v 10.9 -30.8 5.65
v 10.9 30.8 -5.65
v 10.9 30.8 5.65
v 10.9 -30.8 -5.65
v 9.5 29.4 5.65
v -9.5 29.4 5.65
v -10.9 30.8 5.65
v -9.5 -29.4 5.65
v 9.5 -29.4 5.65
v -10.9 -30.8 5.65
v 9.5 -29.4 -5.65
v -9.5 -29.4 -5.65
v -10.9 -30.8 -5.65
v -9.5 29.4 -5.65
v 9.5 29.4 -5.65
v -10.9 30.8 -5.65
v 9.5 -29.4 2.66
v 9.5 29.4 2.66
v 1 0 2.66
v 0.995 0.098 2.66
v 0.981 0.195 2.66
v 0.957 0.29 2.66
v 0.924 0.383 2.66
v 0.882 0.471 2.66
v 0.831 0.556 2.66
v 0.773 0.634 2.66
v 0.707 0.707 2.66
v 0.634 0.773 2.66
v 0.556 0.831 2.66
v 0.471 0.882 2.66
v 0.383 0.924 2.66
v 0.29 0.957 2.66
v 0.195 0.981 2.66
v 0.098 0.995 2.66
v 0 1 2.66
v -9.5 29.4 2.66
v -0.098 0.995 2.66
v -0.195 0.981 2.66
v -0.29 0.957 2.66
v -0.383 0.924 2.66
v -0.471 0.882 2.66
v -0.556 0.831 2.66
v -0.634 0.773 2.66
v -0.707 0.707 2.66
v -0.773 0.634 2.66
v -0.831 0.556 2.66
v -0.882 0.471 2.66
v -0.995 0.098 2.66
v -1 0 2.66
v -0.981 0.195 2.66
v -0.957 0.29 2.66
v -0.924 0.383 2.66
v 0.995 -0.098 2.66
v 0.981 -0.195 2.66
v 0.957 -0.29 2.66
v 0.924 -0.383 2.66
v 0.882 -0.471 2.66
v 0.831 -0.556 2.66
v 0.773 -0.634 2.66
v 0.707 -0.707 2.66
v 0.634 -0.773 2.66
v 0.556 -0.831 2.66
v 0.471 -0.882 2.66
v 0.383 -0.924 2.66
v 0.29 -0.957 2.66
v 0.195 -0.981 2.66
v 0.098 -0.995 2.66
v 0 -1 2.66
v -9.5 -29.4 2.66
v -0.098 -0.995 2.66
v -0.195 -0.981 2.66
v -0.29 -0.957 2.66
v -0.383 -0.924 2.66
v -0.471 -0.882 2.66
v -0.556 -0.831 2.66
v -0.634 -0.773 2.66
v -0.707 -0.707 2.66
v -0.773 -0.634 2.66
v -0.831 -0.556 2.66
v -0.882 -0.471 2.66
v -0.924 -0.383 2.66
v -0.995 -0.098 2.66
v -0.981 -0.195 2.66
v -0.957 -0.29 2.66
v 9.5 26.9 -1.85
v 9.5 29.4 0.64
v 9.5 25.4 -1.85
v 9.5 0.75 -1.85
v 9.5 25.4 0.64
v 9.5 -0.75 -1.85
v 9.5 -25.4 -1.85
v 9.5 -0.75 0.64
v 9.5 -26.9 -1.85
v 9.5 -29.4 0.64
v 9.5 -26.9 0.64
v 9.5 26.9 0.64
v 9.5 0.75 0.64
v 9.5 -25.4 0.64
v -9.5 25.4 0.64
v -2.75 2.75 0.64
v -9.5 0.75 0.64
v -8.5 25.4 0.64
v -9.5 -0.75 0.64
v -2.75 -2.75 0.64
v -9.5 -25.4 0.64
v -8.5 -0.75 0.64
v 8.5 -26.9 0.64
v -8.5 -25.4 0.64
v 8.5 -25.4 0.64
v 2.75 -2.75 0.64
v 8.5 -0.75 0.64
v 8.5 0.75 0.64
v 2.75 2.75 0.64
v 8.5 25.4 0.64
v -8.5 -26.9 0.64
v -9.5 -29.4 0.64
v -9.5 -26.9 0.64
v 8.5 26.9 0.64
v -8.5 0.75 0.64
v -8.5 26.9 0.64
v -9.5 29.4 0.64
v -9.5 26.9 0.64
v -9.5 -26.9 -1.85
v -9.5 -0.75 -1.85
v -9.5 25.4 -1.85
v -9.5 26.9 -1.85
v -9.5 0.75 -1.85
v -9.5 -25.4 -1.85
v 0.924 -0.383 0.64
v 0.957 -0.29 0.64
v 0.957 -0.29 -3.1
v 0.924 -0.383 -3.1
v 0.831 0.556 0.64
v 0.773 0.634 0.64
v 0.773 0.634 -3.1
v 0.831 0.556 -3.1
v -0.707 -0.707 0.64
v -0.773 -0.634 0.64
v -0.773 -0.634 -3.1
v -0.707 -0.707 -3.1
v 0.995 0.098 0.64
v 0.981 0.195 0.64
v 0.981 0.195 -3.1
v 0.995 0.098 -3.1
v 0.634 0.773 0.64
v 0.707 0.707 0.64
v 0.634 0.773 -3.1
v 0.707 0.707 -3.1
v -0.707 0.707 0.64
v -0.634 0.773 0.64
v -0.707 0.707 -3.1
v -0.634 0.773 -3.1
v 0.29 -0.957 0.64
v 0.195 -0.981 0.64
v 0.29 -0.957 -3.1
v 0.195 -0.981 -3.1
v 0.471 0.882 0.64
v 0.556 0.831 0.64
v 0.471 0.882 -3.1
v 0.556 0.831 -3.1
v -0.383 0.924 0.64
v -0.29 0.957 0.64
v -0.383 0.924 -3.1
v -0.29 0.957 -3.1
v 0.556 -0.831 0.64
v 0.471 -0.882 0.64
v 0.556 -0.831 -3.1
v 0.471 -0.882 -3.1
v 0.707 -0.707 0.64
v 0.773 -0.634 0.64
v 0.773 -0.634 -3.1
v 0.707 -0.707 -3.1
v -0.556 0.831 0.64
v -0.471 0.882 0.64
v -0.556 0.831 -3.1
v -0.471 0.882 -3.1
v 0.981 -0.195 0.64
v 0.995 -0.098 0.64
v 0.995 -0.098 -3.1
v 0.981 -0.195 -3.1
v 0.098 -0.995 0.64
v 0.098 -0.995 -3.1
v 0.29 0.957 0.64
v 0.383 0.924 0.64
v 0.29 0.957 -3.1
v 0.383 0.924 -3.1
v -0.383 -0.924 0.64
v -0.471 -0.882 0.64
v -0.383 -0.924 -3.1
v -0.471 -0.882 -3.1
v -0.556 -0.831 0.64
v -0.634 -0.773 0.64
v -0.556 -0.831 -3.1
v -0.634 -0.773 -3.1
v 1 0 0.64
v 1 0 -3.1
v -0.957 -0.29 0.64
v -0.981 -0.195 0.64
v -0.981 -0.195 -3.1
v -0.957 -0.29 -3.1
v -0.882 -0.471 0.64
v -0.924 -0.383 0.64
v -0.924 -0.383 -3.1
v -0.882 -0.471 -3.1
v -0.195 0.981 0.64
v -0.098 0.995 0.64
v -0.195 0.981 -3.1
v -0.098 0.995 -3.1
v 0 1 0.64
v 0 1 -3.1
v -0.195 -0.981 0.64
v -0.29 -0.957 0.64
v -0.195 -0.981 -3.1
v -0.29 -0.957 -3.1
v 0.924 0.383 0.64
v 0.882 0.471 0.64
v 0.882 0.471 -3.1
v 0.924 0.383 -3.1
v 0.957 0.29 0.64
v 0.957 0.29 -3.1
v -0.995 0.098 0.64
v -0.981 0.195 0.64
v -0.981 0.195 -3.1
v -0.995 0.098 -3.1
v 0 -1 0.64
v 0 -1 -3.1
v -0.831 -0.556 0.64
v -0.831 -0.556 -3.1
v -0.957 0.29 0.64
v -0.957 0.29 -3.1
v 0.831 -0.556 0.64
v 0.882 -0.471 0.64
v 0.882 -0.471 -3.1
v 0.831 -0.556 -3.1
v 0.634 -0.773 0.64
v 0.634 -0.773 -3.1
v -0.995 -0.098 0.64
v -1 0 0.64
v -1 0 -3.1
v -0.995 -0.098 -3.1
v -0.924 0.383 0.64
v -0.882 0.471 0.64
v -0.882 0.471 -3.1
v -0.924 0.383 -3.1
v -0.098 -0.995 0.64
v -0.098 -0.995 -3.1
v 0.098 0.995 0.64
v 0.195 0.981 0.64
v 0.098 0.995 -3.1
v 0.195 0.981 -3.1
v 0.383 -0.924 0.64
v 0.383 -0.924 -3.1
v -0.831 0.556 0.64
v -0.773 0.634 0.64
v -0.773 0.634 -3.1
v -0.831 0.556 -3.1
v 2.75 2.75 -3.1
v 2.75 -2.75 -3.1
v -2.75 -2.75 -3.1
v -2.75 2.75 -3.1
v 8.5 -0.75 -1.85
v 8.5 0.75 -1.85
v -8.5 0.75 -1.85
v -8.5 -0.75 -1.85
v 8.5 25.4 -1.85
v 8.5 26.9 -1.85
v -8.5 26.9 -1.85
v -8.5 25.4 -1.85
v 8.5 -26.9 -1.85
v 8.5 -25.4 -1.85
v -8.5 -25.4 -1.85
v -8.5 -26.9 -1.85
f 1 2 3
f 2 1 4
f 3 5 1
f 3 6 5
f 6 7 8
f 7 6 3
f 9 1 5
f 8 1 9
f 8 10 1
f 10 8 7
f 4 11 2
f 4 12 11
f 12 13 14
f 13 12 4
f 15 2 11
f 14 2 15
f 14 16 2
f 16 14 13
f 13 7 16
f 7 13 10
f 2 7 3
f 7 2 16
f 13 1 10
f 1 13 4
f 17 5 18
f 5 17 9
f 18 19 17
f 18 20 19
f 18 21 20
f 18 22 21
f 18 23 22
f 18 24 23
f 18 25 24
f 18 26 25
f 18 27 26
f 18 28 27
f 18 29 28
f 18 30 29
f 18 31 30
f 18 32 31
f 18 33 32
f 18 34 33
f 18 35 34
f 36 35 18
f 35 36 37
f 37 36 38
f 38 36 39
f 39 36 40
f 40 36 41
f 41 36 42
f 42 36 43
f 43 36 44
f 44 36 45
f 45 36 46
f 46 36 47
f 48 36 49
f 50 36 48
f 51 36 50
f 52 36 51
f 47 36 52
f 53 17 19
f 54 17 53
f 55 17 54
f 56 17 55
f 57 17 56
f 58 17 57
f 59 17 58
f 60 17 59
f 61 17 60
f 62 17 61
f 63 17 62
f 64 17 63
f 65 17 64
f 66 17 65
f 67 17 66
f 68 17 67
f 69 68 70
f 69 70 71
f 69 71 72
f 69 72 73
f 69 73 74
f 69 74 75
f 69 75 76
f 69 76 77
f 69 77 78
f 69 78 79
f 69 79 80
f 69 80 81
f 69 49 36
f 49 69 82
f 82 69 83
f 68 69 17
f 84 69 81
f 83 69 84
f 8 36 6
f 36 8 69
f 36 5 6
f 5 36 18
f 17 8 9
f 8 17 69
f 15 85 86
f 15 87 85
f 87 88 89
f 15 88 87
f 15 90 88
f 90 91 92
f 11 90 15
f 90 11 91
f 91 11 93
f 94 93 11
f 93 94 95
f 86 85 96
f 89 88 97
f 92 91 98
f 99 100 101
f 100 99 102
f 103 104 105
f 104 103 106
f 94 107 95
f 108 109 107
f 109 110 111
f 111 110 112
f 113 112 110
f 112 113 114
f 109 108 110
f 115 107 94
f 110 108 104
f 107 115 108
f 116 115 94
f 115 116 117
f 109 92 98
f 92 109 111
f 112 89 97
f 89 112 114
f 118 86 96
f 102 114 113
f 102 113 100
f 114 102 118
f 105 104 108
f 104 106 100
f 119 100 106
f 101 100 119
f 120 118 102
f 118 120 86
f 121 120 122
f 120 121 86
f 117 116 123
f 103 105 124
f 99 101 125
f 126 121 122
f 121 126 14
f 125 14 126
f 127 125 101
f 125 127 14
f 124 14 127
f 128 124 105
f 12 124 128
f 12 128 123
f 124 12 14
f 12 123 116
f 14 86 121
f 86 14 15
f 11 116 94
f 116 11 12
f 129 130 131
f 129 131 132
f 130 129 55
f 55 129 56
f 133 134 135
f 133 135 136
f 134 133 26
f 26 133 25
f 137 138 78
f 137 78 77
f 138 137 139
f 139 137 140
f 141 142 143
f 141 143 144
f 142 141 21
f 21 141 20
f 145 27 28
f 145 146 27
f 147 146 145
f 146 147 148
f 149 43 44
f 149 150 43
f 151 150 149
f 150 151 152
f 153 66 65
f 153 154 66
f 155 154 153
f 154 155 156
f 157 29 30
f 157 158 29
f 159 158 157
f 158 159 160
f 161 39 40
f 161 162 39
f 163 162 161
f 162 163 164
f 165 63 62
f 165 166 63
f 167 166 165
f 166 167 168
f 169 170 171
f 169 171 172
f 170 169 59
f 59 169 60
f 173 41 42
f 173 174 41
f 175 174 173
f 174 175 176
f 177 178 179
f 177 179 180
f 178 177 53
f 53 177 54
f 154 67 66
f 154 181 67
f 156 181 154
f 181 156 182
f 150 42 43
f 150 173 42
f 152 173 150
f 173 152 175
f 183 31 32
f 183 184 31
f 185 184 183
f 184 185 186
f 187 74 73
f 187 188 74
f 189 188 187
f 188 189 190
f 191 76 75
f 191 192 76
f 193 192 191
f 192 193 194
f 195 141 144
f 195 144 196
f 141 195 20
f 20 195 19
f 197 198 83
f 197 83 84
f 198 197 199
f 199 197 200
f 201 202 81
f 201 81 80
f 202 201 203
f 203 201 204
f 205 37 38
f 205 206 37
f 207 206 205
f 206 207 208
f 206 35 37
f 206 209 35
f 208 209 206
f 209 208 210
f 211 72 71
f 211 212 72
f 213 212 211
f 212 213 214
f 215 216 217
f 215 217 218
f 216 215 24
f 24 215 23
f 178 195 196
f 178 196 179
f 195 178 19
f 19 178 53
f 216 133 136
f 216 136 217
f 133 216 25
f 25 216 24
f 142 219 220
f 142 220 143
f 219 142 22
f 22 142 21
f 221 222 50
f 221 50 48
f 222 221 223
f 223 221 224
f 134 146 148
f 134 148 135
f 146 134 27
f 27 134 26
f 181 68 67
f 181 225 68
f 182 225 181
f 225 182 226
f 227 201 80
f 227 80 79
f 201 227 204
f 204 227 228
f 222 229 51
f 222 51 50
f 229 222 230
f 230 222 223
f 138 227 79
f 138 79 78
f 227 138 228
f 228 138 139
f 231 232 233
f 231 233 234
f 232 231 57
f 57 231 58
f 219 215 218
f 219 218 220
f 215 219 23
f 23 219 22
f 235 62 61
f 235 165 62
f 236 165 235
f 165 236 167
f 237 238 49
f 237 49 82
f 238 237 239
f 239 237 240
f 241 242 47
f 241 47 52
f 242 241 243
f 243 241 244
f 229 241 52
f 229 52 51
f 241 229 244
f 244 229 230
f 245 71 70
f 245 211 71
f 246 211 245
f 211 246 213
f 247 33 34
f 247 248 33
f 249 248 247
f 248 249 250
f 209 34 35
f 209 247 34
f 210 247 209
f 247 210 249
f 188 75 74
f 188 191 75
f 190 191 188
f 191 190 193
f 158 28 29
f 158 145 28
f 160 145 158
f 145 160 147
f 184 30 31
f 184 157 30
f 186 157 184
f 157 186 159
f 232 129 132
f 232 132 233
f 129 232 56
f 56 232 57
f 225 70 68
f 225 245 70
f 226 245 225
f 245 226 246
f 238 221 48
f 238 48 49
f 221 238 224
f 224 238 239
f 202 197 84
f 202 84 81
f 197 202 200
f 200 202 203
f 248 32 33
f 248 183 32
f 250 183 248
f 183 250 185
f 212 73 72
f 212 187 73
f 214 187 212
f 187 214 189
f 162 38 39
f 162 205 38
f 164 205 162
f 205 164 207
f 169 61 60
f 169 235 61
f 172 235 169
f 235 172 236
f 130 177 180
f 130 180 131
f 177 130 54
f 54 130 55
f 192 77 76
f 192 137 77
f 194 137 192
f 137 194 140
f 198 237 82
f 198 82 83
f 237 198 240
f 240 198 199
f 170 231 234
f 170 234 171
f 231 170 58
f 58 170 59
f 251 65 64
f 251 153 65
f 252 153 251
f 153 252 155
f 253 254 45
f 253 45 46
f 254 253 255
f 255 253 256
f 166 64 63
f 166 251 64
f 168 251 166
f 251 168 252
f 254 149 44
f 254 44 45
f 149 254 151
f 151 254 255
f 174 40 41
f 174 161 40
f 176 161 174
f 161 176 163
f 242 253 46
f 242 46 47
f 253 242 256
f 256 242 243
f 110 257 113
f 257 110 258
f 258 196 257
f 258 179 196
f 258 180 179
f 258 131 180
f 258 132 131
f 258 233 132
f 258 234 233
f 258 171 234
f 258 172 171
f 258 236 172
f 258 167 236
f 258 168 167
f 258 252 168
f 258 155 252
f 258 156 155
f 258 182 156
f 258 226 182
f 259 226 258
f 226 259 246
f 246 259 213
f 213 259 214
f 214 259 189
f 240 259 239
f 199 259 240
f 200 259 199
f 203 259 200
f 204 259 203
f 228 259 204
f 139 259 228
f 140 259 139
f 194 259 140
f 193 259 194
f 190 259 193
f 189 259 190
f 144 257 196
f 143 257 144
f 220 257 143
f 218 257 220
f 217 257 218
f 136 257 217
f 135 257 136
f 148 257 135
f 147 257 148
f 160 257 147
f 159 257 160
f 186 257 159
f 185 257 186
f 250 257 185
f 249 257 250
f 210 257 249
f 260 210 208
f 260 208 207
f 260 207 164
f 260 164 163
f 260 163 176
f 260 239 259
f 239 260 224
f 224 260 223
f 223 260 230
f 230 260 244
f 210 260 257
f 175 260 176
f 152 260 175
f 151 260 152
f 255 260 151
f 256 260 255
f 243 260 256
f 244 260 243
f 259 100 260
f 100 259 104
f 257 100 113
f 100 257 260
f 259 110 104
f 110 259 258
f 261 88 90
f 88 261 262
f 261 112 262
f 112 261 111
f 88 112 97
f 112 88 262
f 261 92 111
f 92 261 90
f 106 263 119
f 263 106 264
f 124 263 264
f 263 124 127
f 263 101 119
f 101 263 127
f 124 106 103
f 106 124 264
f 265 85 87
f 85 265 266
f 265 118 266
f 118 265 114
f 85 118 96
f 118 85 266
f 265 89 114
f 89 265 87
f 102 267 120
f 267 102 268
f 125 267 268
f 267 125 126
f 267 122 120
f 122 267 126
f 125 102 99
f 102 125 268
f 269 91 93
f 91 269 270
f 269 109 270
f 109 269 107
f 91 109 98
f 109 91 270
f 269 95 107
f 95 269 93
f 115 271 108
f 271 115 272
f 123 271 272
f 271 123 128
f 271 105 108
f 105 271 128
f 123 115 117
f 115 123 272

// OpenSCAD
// 5 hoch
//19 breit
//58.8 lang
// 2mm loch in der mitte in deiner mindest. 5mm säule mitz finnen
// an der mitten seite 1.5 breite finnen beginened 4mm von unterkante
// s#äul bewginnt zwei mm von unterkante
// 2.5 von ausskannte extra finnem
holedia=2;
innerlen=58.8;
innerwidth=19;
wallw=1.4;
outerlen=innerlen+wallw*2;
outerwidth=innerwidth+wallw*2;
topwallh=2;

topouteredge=3;
minhfcarbottom=5;
carbottomh=2.5;
lowouterhang=0.8;
outerheight=topouteredge+minhfcarbottom+carbottomh+lowouterhang;
lowcuth=outerheight-topouteredge-topwallh;//cut from bottom
finw=1.5;//finnwidth
findepth=1;//finndepth
finofs=3.8;//finnofset from ground
dcolmagic=0.5;
dcolofs=2.5;
dcolh=lowcuth-dcolofs; //center col height
dcolz=(dcolh/2)+lowouterhang+dcolofs/2+dcolmagic;//+dcolmagic;
finh=lowcuth;
outerfinofs=2.5;

columnw=5.5; //5 org
echo(outerheight);


traintop();

module traintop(){
    smi=0.01;
    xa=0.2;   
    bofs=lowouterhang+carbottomh;  
    
    difference(){    
        cube([outerwidth,outerlen,outerheight],center=true);        
        //topcut
        translate([0,0,outerheight/2-topouteredge/2+smi])
            cube([innerwidth,innerlen,topouteredge],center=true);
        //bottomcut        
     
            translate([0,0,-outerheight/2+lowcuth/2-smi]) 
                cube([innerwidth,innerlen,lowcuth],center=true);     
      
        //central hole
       translate([0,0,-outerheight/2-0.5])
           cylinder(d=holedia,h=outerheight*1.1,$fn=64);
    }
    //add middle finns    
    translate([innerwidth/2-findepth/2,0,-outerheight/2+lowcuth/2+finofs/2])
        cube([findepth,finw,finh-finofs],center=true);
    
    translate([-innerwidth/2+findepth/2,0,-outerheight/2+lowcuth/2+finofs/2])
        cube([findepth,finw,finh-finofs],center=true);
    // add fins there
    translate([innerwidth/2-findepth/2,innerlen/2-outerfinofs-finw/2,-outerheight/2+lowcuth/2+finofs/2])
        cube([findepth,finw,finh-finofs],center=true);
    
    translate([-innerwidth/2+findepth/2,innerlen/2-outerfinofs-finw/2,-outerheight/2+lowcuth/2+finofs/2])
        cube([findepth,finw,finh-finofs],center=true);
    
    // and add fins thore
    translate([innerwidth/2-findepth/2,-innerlen/2+outerfinofs+finw/2,-outerheight/2+lowcuth/2+finofs/2])
        cube([findepth,finw,finh-finofs],center=true);
    
    translate([-innerwidth/2+findepth/2,-innerlen/2+outerfinofs+finw/2,-outerheight/2+lowcuth/2+finofs/2])
        cube([findepth,finw,finh-finofs],center=true);
    
    //centercolumn                
    
    difference(){
       translate([0,0,-outerheight/2+dcolz]) 
            cube([columnw,columnw,dcolh],center=true);
        translate([0,0,-outerheight/2-0.5])
           cylinder(d=holedia,h=outerheight*1.1,$fn=64);
    }
         
    //mesure
    *translate([0,0,-outerheight/2+dcolofs/2]){         
        cube([2,2,dcolofs],center=true);
    }
    //translate([0,0,-outerheight/2+lowcuth/2])
    
}
